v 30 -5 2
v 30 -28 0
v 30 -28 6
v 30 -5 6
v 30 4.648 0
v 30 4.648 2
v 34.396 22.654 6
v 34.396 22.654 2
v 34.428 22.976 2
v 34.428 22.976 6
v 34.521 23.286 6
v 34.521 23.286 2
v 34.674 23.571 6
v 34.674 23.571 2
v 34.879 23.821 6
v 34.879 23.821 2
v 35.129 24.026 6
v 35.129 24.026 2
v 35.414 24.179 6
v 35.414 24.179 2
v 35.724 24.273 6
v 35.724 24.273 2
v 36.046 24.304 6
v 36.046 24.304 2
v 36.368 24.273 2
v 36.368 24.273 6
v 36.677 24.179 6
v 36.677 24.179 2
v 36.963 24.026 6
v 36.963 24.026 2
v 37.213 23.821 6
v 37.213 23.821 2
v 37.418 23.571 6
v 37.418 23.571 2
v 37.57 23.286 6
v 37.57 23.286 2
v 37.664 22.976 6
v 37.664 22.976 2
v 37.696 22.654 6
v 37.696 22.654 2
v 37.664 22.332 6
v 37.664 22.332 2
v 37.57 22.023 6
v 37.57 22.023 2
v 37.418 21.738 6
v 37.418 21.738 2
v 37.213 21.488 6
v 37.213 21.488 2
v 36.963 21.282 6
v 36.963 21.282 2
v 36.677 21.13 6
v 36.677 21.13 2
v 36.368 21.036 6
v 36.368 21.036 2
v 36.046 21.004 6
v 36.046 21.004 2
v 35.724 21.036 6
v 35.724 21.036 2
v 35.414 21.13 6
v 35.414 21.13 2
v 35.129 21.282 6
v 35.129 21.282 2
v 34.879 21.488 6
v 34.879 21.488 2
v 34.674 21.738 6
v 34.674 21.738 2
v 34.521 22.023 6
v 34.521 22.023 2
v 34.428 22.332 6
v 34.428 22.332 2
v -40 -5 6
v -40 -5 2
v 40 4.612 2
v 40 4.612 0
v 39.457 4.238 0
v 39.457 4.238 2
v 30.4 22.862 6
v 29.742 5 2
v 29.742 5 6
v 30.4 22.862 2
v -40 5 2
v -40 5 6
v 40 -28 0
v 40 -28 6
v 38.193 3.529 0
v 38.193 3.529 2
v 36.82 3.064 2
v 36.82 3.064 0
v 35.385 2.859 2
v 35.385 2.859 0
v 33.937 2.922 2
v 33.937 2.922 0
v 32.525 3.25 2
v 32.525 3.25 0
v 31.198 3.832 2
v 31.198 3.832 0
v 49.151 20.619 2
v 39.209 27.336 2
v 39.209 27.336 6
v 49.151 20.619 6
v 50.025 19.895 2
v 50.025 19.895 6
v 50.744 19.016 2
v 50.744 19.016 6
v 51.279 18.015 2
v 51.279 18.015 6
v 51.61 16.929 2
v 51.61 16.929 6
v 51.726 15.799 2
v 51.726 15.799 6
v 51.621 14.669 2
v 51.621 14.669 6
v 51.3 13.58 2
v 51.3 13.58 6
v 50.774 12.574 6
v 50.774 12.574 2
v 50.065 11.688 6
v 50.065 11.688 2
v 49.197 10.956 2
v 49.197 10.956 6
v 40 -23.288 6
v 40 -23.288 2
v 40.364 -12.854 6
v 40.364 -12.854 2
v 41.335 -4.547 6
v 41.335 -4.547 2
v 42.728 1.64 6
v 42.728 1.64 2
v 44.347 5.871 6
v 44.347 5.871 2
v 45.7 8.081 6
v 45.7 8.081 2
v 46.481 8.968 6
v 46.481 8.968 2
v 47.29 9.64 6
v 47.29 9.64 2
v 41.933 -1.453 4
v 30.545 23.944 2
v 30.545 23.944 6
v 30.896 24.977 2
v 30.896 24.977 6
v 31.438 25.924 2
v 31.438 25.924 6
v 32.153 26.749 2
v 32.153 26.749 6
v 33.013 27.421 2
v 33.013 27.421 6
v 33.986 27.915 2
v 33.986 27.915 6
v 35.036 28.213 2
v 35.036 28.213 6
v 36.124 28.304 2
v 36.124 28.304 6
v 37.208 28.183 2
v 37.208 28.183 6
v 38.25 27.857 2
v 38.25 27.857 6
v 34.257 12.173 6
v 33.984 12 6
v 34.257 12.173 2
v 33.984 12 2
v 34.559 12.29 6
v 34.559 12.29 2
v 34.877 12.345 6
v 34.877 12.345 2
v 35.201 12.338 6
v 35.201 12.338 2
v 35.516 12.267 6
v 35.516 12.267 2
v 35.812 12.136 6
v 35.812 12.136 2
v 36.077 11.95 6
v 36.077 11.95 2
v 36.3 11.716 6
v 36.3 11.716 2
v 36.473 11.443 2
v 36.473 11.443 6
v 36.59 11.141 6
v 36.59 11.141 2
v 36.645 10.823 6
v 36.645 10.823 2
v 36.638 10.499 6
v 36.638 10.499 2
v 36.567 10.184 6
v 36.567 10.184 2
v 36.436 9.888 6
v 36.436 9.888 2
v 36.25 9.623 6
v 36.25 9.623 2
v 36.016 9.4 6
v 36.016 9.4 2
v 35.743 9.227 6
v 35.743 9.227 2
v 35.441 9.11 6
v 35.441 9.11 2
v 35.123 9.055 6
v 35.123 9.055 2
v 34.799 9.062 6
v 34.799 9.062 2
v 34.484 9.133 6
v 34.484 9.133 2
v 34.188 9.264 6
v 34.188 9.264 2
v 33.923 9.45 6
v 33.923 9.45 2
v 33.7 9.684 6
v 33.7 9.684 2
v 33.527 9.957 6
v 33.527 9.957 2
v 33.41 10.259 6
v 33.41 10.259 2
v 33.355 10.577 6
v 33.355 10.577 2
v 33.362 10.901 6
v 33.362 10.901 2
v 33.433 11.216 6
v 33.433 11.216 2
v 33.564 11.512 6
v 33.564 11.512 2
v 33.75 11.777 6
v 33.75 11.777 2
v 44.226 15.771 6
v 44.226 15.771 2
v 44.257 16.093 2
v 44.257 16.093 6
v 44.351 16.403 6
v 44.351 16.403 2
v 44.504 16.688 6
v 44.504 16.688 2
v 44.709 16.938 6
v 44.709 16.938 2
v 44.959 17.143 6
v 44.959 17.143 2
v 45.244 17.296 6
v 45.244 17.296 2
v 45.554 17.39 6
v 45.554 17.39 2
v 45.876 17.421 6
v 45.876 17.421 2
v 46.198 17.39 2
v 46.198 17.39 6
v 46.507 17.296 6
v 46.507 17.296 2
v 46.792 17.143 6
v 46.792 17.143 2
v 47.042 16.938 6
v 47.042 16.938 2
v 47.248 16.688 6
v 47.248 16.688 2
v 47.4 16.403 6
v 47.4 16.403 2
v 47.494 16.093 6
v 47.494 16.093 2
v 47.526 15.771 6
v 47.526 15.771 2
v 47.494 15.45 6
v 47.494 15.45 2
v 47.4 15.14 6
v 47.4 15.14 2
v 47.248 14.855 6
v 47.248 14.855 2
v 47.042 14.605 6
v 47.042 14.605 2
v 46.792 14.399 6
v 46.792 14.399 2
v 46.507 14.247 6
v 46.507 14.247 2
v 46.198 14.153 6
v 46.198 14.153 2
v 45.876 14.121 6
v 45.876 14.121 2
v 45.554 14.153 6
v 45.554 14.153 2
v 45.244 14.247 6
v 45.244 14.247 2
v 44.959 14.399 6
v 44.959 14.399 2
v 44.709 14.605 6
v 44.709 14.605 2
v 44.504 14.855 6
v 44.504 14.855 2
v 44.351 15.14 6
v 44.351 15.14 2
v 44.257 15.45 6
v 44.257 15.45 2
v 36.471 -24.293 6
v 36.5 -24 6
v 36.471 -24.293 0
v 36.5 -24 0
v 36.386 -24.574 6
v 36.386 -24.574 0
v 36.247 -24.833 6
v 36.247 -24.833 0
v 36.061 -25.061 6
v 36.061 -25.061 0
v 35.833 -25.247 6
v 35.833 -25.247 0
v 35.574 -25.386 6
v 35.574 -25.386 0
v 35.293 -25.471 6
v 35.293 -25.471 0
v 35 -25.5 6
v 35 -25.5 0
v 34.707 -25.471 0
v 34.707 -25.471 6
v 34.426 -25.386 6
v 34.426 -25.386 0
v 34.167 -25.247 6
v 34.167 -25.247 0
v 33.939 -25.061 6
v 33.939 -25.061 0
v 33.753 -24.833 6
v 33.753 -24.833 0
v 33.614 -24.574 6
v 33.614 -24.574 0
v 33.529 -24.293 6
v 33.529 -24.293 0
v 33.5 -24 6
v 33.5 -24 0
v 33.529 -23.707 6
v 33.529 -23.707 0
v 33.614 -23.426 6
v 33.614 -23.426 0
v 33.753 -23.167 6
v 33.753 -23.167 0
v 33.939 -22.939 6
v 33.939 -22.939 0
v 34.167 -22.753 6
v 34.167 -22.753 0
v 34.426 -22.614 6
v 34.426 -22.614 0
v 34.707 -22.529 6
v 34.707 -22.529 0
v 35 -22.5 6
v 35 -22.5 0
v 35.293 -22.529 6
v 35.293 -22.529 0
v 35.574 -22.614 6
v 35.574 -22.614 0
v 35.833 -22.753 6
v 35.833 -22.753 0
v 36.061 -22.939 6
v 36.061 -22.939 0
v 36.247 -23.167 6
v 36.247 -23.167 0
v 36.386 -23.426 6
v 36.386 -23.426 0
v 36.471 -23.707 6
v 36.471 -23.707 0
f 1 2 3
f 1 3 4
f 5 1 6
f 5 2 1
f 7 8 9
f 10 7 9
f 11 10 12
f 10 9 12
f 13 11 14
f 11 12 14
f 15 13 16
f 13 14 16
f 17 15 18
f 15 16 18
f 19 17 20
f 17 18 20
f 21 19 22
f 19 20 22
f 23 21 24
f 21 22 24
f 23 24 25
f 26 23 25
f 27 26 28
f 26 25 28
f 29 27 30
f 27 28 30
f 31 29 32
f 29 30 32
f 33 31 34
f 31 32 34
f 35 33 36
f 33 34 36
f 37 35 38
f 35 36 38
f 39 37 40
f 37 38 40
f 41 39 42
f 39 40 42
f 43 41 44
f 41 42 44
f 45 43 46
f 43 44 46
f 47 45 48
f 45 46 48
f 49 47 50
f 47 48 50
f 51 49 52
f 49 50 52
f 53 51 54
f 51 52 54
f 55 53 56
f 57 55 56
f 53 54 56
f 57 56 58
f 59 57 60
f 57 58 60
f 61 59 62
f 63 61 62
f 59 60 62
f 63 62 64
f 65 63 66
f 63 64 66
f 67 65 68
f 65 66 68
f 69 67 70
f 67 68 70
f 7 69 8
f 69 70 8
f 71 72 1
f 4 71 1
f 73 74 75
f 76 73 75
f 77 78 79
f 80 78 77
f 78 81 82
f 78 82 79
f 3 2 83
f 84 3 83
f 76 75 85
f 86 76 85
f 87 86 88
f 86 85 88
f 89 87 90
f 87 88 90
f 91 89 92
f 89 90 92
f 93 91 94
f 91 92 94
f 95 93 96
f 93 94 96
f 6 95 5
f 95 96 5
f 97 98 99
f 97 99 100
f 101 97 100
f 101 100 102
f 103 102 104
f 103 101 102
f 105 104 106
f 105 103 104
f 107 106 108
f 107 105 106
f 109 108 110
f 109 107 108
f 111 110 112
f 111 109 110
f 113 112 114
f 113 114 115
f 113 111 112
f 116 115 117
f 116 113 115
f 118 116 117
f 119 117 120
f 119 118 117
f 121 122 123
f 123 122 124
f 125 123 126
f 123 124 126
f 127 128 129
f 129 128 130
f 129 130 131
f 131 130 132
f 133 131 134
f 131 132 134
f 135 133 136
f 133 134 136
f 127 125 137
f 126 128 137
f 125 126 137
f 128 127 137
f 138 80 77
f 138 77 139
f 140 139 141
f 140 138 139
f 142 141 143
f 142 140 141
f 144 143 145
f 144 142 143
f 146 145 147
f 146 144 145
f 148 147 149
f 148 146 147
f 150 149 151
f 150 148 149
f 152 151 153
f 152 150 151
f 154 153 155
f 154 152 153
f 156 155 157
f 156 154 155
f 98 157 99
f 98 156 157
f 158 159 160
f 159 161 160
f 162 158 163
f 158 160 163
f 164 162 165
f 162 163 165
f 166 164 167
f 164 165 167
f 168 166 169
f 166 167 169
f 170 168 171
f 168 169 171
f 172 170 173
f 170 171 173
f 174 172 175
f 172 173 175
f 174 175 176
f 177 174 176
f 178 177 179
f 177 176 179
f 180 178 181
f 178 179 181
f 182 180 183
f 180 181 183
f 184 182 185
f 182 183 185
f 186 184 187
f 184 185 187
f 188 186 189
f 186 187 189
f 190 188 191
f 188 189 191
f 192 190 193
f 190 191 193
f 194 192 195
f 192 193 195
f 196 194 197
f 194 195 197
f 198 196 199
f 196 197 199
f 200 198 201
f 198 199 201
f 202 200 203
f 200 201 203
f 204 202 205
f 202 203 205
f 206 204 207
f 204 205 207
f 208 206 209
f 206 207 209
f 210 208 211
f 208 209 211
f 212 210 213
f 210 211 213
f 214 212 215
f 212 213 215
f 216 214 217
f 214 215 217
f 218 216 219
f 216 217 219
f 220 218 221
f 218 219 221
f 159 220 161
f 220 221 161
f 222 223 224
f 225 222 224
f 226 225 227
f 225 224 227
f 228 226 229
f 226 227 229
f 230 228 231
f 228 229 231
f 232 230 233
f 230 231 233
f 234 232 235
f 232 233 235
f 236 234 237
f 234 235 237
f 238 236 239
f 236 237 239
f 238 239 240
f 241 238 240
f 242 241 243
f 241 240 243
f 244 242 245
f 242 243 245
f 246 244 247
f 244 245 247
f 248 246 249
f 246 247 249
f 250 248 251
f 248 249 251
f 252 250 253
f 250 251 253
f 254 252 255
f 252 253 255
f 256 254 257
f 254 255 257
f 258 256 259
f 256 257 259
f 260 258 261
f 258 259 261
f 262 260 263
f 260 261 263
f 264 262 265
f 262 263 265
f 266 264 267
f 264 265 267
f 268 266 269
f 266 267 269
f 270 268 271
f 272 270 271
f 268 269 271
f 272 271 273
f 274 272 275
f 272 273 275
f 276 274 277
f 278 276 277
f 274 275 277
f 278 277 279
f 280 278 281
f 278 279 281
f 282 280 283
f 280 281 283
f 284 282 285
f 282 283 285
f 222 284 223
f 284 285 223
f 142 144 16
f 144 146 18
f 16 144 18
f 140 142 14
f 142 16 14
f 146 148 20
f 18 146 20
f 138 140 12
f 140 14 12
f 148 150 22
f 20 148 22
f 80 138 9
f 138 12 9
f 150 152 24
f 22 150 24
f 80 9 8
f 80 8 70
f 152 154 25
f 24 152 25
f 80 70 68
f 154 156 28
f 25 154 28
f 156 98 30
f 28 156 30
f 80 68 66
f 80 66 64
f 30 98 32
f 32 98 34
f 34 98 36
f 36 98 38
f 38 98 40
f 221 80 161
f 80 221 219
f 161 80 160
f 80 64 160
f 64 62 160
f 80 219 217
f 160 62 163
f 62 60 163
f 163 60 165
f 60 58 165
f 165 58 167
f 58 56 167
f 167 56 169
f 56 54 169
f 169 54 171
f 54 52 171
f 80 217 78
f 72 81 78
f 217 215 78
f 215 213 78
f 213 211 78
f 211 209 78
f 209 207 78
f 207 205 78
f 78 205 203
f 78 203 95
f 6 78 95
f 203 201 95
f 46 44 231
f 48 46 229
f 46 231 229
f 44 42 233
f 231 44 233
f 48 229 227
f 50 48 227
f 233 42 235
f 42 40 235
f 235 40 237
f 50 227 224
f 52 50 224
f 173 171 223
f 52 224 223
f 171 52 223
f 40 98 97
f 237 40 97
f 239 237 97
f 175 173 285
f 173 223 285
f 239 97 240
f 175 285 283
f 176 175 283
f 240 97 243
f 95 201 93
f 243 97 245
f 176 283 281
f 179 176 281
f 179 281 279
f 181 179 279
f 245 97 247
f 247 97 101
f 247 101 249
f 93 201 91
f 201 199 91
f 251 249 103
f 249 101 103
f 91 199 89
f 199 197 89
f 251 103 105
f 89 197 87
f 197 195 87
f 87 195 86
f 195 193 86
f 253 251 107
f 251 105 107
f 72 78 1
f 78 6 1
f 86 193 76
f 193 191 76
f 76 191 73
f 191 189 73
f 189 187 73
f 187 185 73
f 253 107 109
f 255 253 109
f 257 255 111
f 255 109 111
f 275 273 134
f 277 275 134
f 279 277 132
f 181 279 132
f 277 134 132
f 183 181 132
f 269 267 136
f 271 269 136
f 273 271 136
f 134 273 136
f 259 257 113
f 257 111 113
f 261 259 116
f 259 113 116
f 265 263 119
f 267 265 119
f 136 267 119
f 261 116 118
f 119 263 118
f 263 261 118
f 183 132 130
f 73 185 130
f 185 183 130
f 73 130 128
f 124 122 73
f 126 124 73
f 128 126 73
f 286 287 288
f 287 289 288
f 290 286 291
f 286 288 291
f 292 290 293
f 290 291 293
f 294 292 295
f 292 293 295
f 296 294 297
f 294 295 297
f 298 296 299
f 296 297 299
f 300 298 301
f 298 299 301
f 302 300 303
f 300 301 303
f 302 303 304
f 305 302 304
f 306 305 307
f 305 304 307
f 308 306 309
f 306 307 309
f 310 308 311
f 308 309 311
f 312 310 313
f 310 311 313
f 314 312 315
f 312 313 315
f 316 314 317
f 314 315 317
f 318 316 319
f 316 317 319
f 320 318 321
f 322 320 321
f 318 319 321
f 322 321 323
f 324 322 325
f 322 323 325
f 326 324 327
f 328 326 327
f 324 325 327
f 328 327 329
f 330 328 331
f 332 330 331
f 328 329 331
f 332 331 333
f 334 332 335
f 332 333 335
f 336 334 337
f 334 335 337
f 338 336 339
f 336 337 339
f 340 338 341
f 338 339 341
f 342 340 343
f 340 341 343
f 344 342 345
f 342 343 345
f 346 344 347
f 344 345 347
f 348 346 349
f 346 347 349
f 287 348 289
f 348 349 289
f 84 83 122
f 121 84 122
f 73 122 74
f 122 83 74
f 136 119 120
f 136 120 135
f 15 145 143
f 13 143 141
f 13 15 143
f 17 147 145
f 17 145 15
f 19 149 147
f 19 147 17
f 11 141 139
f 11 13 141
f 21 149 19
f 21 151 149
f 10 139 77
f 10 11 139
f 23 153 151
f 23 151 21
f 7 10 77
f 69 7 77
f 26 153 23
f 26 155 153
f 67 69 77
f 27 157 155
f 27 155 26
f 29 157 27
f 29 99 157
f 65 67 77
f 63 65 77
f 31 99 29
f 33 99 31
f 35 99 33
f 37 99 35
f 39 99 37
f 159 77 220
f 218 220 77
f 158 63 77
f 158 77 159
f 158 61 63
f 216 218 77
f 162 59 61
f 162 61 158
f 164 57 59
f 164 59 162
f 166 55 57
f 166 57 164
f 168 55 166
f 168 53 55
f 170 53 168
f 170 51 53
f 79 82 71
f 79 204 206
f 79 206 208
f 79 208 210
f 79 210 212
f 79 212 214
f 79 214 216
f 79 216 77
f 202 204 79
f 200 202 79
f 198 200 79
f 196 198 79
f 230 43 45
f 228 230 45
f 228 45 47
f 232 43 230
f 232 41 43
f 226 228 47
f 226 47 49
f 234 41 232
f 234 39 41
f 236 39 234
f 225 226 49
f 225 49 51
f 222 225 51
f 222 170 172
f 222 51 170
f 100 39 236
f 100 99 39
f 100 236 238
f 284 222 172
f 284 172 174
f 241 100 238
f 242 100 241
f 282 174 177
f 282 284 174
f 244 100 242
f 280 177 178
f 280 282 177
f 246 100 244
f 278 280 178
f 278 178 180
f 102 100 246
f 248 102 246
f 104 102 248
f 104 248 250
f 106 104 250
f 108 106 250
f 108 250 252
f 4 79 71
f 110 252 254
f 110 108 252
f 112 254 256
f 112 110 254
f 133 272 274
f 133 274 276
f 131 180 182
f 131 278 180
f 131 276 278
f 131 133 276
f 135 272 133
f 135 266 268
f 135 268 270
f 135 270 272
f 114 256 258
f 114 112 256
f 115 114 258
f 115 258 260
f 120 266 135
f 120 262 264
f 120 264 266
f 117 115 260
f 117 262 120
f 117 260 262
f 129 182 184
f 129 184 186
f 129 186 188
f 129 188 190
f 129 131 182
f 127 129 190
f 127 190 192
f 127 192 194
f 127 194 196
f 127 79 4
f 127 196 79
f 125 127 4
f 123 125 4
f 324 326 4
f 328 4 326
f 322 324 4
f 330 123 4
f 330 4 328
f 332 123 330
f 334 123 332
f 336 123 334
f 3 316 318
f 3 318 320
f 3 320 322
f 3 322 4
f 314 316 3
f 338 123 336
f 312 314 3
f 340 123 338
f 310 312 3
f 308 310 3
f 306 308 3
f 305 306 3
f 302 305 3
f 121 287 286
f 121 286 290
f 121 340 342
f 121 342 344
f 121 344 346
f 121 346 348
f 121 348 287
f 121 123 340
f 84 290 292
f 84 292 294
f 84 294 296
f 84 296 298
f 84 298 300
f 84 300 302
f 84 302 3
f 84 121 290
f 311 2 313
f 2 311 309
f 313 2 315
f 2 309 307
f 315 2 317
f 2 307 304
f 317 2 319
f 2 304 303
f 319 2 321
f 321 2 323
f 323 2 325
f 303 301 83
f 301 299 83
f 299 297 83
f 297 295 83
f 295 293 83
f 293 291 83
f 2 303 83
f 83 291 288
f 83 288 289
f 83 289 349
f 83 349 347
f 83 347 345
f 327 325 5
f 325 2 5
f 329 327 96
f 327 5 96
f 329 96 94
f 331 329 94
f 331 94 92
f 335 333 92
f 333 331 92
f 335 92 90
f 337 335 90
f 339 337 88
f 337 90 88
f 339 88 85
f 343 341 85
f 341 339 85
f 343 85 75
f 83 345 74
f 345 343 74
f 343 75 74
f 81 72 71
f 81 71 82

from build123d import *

# Parameters (mm, degrees)
IZIM1_W                     = 80
IZIM1_H                     = 10
IZIM1_W_2                   = 10
IZIM1_H_2                   = 40
Y_KSEKLIK_EKSTR_ZYON1_DEPTH = 6
IZIM1_3_W                   = 70
IZIM1_3_H                   = 10
KES_EKSTR_ZYON1_DEPTH       = 2
IZIM4_R                     = 1.5
IZIM4_R_2                   = 1.65
Y_KSEKLIK_EKSTR_ZYON4_DEPTH = 4
IZIM4_3_R                   = 1.5
IZIM4_3_R_2                 = 1.65
KES_EKSTR_ZYON3_DEPTH       = 5
KES_EKSTR_ZYON5_START       = 6
IZIM4_6_R                   = 1.5
IZIM4_6_R_2                 = 1.65
KES_EKSTR_ZYON5_DEPTH       = 6


with BuildPart() as part:
    # Çizim1 → Yükseklik-Ekstrüzyon1 (new body)
    with BuildSketch(Plane.XY):
        Rectangle(IZIM1_W, IZIM1_H)
        with Locations((35, -8)):
            Rectangle(IZIM1_W_2, IZIM1_H_2)
    extrude(amount=Y_KSEKLIK_EKSTR_ZYON1_DEPTH)

    # Çizim1<3> → Kes-Ekstrüzyon1 (cut)
    with BuildSketch(Plane.XY):
        with Locations((-5, 0)):
            Rectangle(IZIM1_3_W, IZIM1_3_H)
    extrude(amount=KES_EKSTR_ZYON1_DEPTH, mode=Mode.SUBTRACT)

    # Çizim4 → Yükseklik-Ekstrüzyon4 (add)
    # profile 1 of 2: a face of its own
    with BuildSketch(Plane(origin=(0, 0, 2), x_dir=(-1, 0, 0), z_dir=(0, 0, -1))):
        with Locations((-35, -24)):
            Circle(IZIM4_R)
    # profile 2 of 2: a face of its own
    with BuildSketch(Plane(origin=(0, 0, 2), x_dir=(-1, 0, 0), z_dir=(0, 0, -1))):
        with BuildLine():
            Line((-29.73781884, 4.874886315), (-30.399690089, 22.862097513))
            ThreePointArc((-30.399690089, 22.862097513), (-33.487518923, 27.691929585), (-39.208988831, 27.335914357))
            Line((-39.208988831, 27.335914357), (-49.15078221, 20.618716695))
            ThreePointArc((-49.15078221, 20.618716695), (-51.725626297, 15.799448116), (-49.197080807, 10.955727499))
            Line((-49.197080807, 10.955727499), (-39.45690441, 4.237918054))
            ThreePointArc((-39.45690441, 4.237918054), (-34.486628982, 2.866804599), (-29.73781884, 4.874886315))
        make_face()
        with Locations((-36.045868913, 22.654336377)):
            Circle(IZIM4_R_2, mode=Mode.SUBTRACT)
        with Locations((-45.875693444, 15.771419141)):
            Circle(IZIM4_R_2, mode=Mode.SUBTRACT)
        with Locations((-35, 10.7)):
            Circle(IZIM4_R_2, mode=Mode.SUBTRACT)
    extrude(amount=-Y_KSEKLIK_EKSTR_ZYON4_DEPTH)

    # Çizim4<3> → Kes-Ekstrüzyon3 (cut, symmetric)
    with BuildSketch(Plane(origin=(0, 0, 2), x_dir=(-1, 0, 0), z_dir=(0, 0, -1))):
        with Locations(Location((-35, -24, 0), (0, 0, 180))):
            Circle(IZIM4_3_R)
        with Locations((-45.875693444, 15.771419141)):
            Circle(IZIM4_3_R_2)
        with Locations(Location((-35, 10.7, 0), (0, 0, 51.987720456))):
            Circle(IZIM4_3_R_2)
    extrude(amount=KES_EKSTR_ZYON3_DEPTH, both=True, mode=Mode.SUBTRACT)

    # Çizim4<6> → Kes-Ekstrüzyon5 (cut)
    # profile 1 of 2: a face of its own
    with BuildSketch(Plane(origin=(0, 0, 2), x_dir=(-1, 0, 0), z_dir=(0, 0, -1)).offset(KES_EKSTR_ZYON5_START)):
        with Locations(Location((-35, -24, 0), (0, 0, 180))):
            Circle(IZIM4_6_R)
    # profile 2 of 2: a face of its own
    with BuildSketch(Plane(origin=(0, 0, 2), x_dir=(-1, 0, 0), z_dir=(0, 0, -1)).offset(KES_EKSTR_ZYON5_START)):
        with BuildLine():
            Line((-29.73781884, 4.874886315), (-30.399690089, 22.862097513))
            ThreePointArc((-30.399690089, 22.862097513), (-33.487518923, 27.691929585), (-39.208988831, 27.335914357))
            Line((-39.208988831, 27.335914357), (-49.15078221, 20.618716695))
            ThreePointArc((-49.15078221, 20.618716695), (-51.725626297, 15.799448116), (-49.197080807, 10.955727499))
            Line((-49.197080807, 10.955727499), (-39.45690441, 4.237918054))
            ThreePointArc((-39.45690441, 4.237918054), (-34.486628982, 2.866804599), (-29.73781884, 4.874886315))
        make_face()
        with Locations((-36.045868913, 22.654336377)):
            Circle(IZIM4_6_R_2, mode=Mode.SUBTRACT)
        with Locations((-45.875693444, 15.771419141)):
            Circle(IZIM4_6_R_2, mode=Mode.SUBTRACT)
        with Locations((-35, 10.7)):
            Circle(IZIM4_6_R_2, mode=Mode.SUBTRACT)
    extrude(amount=-KES_EKSTR_ZYON5_DEPTH, mode=Mode.SUBTRACT)

    # Radyus2
    # a fillet whose section is not a circle: 40, 30 mm, written as the material it adds along each edge
    with BuildSketch(Plane(origin=(40, 4.612491628, 2), x_dir=(0, -1, 0), z_dir=(0, 0, 1))) as radyus2_piece_1:
        with BuildLine():
            Bezier((27.900120921, 0), (0, 0), (-5.027685175, 7.289659058), weights=[1, 0.885369562, 1])
            Line((-5.027685175, 7.289659058), (0, 0))
            Line((0, 0), (27.900120921, 0))
        make_face()
    extrude(amount=4)


solid = part.part
